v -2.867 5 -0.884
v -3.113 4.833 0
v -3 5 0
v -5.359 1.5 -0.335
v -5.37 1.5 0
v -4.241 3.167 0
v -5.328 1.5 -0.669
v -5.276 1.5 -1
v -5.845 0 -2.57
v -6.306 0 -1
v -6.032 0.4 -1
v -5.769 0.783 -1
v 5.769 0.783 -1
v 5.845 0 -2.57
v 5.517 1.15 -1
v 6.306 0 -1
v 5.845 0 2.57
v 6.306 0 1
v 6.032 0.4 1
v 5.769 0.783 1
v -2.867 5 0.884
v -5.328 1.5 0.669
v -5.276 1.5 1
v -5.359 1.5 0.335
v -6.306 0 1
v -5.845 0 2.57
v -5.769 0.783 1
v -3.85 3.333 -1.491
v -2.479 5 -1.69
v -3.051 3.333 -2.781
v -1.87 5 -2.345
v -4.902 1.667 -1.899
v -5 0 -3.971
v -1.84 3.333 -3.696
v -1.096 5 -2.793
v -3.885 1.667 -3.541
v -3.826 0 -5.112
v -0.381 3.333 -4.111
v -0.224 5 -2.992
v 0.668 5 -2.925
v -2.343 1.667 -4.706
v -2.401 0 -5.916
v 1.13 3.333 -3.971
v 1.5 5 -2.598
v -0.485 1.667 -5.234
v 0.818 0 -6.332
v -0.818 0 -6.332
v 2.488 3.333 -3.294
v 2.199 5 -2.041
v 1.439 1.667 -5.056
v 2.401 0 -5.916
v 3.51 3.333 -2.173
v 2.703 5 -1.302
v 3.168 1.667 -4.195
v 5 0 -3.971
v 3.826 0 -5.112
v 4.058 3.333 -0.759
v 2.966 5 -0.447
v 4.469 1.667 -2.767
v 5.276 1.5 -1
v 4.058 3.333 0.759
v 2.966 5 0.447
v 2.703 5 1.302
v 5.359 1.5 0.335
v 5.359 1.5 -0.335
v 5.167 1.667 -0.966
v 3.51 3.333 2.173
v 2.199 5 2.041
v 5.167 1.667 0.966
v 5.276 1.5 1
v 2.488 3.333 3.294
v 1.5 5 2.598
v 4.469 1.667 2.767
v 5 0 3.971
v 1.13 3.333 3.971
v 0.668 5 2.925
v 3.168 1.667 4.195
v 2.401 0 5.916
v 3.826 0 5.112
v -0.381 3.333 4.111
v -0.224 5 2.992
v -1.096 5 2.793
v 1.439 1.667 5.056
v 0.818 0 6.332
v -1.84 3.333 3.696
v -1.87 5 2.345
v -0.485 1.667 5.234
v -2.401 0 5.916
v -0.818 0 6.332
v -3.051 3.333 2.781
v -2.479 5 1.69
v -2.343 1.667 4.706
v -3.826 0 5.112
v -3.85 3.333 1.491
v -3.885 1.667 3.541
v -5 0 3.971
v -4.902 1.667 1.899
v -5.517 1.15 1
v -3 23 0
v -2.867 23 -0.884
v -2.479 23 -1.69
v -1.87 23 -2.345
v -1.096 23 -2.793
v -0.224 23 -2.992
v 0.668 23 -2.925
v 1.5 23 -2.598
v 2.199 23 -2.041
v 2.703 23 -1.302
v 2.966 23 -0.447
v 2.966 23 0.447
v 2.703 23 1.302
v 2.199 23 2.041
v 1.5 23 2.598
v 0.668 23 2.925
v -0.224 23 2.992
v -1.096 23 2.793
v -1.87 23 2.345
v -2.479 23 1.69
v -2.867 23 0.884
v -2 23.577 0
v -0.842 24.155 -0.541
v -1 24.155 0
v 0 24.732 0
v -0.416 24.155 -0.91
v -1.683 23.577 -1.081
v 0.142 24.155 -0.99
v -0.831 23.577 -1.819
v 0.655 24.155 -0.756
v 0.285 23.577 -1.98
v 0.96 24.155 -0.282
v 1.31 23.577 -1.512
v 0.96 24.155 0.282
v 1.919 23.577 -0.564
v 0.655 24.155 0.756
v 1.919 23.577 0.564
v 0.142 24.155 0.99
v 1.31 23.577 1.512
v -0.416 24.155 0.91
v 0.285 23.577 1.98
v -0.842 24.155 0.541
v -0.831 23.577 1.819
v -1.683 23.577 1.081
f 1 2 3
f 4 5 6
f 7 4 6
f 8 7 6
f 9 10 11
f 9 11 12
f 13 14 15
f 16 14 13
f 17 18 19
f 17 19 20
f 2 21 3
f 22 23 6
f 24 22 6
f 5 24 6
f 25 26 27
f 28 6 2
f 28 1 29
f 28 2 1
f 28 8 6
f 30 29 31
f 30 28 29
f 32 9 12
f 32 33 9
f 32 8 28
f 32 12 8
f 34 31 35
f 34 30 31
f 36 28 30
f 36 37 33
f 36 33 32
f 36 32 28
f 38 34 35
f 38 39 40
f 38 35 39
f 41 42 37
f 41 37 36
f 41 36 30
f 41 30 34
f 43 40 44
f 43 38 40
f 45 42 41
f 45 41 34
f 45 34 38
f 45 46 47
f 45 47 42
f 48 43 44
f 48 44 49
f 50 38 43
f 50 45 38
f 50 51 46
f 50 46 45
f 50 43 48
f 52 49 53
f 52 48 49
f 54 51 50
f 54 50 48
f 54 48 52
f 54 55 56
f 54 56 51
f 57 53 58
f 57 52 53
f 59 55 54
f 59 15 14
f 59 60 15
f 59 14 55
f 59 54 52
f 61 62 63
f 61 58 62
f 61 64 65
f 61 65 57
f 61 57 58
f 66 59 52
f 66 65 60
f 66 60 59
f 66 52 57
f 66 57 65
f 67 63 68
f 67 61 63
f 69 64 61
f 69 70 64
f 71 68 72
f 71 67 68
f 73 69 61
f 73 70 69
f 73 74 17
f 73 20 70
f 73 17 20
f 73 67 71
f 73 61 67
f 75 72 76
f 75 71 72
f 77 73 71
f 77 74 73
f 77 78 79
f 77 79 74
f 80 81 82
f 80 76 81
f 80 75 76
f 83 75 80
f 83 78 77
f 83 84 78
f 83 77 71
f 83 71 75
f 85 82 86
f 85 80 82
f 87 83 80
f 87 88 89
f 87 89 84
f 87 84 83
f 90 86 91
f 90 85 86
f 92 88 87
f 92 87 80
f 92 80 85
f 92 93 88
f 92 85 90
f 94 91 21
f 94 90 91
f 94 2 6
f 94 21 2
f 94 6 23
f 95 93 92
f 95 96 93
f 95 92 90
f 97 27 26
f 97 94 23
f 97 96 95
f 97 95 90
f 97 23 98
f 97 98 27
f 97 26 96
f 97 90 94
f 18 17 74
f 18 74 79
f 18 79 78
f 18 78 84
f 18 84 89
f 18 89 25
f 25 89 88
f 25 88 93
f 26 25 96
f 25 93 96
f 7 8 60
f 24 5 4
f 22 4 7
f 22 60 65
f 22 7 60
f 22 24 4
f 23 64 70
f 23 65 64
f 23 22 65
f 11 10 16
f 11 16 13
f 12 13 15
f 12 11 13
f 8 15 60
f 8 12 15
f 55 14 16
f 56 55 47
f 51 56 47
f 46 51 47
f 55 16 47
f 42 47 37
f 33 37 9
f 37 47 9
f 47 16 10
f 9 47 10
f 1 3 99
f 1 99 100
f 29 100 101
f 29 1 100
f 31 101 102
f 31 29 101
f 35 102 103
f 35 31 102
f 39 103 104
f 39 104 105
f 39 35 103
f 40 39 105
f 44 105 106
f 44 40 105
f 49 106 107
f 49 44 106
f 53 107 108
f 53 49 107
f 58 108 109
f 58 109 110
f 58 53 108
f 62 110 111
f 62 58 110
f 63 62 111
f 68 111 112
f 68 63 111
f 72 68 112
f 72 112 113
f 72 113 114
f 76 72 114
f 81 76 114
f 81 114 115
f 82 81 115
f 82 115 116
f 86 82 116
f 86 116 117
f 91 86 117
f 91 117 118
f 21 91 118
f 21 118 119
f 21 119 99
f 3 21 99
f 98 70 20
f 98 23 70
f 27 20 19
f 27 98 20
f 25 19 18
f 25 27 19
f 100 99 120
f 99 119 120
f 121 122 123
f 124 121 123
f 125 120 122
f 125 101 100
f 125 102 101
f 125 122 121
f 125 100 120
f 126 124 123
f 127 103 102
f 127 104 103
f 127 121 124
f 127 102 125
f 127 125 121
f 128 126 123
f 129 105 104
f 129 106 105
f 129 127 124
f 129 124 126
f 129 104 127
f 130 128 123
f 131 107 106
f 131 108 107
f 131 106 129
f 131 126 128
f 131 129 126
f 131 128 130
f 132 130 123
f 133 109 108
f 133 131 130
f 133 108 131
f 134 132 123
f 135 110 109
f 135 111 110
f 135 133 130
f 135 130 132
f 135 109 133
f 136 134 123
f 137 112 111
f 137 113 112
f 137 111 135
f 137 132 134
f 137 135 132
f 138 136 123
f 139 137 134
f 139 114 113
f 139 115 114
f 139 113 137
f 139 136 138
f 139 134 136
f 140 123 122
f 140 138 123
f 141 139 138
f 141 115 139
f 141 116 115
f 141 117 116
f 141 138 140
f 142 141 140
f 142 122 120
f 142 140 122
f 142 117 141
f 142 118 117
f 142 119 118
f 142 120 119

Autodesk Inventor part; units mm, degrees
ref_plane "YZ Plane" through (0, 0, 0) normal (1, 0, 0) x (0, 1, 0)
sketch "Sketch1" plane through (0, 0, 0) normal (0, 1, 0) x (-1, 0, 0)
  circle A0 centre (0, 0) radius 6.385
  dimension "d0" = 12.77
ref_plane "Work Plane1" through (0, 5, 0) normal (0, 1, 0) x (-1, 0, 0)
sketch "Sketch2" plane through (0, 5, 0) normal (0, 1, 0) x (-1, 0, 0)
  circle A0 centre (0, 0) radius 3
  dimension "d2" = 6
extrude "Extrusion1" add sketch "Sketch2" along normal blind 18
loft "Loft1" add profiles "Sketch1" section 2 edges at (3, 5, 0)
sketch "Sketch3" plane through (0, 0, 0) normal (1, 0, 0) x (0, 1, 0)
  line L0 (1.5, 1) -> (-1.5, 1)
  line L1 (-1.5, 1) -> (-1.5, -1)
  line L2 (-1.5, -1) -> (1.5, -1)
  line L3 (1.5, -1) -> (1.5, 1)
  line L4 (1.5, 1) -> (-1.5, -1) construction
  line L5 (-1.5, 1) -> (1.5, -1) construction
  point P0 (0, 0)
  dimension "d9" = 3
  dimension "d10" = 2
extrude "Extrusion2" cut sketch "Sketch3" along normal mid plane 15
sketch "Sketch5" plane through (0, 0, 0) normal (1, 0, 0) x (0, 1, 0)
  line L0 (23, -3) -> (23, 3) projected
  line L1 (23, 3) -> (24.7321, 0)
  line L2 (24.7321, 0) -> (23, -3)
  line L3 (23, -3) -> (23, 3)
  point P0 (0, 0)
  dimension "d13" = 120
sketch "Sketch8" plane through (0, 0, 0) normal (1, 0, 0) x (0, 1, 0)
  point P0 (0, 0)
ref_plane "Work Plane2" through (0, 24.732, 0) normal (0, 1, 0) x (1, 0, 0)
sketch "Sketch9" plane through (0, 24.732, 0) normal (0, 1, 0) x (1, 0, 0)
  circle A0 centre (0, 0) radius 0.0005
  dimension "d15" = 0.001
loft "Loft2" add profiles "Sketch9" section 1 edges at (3, 23, 0)
